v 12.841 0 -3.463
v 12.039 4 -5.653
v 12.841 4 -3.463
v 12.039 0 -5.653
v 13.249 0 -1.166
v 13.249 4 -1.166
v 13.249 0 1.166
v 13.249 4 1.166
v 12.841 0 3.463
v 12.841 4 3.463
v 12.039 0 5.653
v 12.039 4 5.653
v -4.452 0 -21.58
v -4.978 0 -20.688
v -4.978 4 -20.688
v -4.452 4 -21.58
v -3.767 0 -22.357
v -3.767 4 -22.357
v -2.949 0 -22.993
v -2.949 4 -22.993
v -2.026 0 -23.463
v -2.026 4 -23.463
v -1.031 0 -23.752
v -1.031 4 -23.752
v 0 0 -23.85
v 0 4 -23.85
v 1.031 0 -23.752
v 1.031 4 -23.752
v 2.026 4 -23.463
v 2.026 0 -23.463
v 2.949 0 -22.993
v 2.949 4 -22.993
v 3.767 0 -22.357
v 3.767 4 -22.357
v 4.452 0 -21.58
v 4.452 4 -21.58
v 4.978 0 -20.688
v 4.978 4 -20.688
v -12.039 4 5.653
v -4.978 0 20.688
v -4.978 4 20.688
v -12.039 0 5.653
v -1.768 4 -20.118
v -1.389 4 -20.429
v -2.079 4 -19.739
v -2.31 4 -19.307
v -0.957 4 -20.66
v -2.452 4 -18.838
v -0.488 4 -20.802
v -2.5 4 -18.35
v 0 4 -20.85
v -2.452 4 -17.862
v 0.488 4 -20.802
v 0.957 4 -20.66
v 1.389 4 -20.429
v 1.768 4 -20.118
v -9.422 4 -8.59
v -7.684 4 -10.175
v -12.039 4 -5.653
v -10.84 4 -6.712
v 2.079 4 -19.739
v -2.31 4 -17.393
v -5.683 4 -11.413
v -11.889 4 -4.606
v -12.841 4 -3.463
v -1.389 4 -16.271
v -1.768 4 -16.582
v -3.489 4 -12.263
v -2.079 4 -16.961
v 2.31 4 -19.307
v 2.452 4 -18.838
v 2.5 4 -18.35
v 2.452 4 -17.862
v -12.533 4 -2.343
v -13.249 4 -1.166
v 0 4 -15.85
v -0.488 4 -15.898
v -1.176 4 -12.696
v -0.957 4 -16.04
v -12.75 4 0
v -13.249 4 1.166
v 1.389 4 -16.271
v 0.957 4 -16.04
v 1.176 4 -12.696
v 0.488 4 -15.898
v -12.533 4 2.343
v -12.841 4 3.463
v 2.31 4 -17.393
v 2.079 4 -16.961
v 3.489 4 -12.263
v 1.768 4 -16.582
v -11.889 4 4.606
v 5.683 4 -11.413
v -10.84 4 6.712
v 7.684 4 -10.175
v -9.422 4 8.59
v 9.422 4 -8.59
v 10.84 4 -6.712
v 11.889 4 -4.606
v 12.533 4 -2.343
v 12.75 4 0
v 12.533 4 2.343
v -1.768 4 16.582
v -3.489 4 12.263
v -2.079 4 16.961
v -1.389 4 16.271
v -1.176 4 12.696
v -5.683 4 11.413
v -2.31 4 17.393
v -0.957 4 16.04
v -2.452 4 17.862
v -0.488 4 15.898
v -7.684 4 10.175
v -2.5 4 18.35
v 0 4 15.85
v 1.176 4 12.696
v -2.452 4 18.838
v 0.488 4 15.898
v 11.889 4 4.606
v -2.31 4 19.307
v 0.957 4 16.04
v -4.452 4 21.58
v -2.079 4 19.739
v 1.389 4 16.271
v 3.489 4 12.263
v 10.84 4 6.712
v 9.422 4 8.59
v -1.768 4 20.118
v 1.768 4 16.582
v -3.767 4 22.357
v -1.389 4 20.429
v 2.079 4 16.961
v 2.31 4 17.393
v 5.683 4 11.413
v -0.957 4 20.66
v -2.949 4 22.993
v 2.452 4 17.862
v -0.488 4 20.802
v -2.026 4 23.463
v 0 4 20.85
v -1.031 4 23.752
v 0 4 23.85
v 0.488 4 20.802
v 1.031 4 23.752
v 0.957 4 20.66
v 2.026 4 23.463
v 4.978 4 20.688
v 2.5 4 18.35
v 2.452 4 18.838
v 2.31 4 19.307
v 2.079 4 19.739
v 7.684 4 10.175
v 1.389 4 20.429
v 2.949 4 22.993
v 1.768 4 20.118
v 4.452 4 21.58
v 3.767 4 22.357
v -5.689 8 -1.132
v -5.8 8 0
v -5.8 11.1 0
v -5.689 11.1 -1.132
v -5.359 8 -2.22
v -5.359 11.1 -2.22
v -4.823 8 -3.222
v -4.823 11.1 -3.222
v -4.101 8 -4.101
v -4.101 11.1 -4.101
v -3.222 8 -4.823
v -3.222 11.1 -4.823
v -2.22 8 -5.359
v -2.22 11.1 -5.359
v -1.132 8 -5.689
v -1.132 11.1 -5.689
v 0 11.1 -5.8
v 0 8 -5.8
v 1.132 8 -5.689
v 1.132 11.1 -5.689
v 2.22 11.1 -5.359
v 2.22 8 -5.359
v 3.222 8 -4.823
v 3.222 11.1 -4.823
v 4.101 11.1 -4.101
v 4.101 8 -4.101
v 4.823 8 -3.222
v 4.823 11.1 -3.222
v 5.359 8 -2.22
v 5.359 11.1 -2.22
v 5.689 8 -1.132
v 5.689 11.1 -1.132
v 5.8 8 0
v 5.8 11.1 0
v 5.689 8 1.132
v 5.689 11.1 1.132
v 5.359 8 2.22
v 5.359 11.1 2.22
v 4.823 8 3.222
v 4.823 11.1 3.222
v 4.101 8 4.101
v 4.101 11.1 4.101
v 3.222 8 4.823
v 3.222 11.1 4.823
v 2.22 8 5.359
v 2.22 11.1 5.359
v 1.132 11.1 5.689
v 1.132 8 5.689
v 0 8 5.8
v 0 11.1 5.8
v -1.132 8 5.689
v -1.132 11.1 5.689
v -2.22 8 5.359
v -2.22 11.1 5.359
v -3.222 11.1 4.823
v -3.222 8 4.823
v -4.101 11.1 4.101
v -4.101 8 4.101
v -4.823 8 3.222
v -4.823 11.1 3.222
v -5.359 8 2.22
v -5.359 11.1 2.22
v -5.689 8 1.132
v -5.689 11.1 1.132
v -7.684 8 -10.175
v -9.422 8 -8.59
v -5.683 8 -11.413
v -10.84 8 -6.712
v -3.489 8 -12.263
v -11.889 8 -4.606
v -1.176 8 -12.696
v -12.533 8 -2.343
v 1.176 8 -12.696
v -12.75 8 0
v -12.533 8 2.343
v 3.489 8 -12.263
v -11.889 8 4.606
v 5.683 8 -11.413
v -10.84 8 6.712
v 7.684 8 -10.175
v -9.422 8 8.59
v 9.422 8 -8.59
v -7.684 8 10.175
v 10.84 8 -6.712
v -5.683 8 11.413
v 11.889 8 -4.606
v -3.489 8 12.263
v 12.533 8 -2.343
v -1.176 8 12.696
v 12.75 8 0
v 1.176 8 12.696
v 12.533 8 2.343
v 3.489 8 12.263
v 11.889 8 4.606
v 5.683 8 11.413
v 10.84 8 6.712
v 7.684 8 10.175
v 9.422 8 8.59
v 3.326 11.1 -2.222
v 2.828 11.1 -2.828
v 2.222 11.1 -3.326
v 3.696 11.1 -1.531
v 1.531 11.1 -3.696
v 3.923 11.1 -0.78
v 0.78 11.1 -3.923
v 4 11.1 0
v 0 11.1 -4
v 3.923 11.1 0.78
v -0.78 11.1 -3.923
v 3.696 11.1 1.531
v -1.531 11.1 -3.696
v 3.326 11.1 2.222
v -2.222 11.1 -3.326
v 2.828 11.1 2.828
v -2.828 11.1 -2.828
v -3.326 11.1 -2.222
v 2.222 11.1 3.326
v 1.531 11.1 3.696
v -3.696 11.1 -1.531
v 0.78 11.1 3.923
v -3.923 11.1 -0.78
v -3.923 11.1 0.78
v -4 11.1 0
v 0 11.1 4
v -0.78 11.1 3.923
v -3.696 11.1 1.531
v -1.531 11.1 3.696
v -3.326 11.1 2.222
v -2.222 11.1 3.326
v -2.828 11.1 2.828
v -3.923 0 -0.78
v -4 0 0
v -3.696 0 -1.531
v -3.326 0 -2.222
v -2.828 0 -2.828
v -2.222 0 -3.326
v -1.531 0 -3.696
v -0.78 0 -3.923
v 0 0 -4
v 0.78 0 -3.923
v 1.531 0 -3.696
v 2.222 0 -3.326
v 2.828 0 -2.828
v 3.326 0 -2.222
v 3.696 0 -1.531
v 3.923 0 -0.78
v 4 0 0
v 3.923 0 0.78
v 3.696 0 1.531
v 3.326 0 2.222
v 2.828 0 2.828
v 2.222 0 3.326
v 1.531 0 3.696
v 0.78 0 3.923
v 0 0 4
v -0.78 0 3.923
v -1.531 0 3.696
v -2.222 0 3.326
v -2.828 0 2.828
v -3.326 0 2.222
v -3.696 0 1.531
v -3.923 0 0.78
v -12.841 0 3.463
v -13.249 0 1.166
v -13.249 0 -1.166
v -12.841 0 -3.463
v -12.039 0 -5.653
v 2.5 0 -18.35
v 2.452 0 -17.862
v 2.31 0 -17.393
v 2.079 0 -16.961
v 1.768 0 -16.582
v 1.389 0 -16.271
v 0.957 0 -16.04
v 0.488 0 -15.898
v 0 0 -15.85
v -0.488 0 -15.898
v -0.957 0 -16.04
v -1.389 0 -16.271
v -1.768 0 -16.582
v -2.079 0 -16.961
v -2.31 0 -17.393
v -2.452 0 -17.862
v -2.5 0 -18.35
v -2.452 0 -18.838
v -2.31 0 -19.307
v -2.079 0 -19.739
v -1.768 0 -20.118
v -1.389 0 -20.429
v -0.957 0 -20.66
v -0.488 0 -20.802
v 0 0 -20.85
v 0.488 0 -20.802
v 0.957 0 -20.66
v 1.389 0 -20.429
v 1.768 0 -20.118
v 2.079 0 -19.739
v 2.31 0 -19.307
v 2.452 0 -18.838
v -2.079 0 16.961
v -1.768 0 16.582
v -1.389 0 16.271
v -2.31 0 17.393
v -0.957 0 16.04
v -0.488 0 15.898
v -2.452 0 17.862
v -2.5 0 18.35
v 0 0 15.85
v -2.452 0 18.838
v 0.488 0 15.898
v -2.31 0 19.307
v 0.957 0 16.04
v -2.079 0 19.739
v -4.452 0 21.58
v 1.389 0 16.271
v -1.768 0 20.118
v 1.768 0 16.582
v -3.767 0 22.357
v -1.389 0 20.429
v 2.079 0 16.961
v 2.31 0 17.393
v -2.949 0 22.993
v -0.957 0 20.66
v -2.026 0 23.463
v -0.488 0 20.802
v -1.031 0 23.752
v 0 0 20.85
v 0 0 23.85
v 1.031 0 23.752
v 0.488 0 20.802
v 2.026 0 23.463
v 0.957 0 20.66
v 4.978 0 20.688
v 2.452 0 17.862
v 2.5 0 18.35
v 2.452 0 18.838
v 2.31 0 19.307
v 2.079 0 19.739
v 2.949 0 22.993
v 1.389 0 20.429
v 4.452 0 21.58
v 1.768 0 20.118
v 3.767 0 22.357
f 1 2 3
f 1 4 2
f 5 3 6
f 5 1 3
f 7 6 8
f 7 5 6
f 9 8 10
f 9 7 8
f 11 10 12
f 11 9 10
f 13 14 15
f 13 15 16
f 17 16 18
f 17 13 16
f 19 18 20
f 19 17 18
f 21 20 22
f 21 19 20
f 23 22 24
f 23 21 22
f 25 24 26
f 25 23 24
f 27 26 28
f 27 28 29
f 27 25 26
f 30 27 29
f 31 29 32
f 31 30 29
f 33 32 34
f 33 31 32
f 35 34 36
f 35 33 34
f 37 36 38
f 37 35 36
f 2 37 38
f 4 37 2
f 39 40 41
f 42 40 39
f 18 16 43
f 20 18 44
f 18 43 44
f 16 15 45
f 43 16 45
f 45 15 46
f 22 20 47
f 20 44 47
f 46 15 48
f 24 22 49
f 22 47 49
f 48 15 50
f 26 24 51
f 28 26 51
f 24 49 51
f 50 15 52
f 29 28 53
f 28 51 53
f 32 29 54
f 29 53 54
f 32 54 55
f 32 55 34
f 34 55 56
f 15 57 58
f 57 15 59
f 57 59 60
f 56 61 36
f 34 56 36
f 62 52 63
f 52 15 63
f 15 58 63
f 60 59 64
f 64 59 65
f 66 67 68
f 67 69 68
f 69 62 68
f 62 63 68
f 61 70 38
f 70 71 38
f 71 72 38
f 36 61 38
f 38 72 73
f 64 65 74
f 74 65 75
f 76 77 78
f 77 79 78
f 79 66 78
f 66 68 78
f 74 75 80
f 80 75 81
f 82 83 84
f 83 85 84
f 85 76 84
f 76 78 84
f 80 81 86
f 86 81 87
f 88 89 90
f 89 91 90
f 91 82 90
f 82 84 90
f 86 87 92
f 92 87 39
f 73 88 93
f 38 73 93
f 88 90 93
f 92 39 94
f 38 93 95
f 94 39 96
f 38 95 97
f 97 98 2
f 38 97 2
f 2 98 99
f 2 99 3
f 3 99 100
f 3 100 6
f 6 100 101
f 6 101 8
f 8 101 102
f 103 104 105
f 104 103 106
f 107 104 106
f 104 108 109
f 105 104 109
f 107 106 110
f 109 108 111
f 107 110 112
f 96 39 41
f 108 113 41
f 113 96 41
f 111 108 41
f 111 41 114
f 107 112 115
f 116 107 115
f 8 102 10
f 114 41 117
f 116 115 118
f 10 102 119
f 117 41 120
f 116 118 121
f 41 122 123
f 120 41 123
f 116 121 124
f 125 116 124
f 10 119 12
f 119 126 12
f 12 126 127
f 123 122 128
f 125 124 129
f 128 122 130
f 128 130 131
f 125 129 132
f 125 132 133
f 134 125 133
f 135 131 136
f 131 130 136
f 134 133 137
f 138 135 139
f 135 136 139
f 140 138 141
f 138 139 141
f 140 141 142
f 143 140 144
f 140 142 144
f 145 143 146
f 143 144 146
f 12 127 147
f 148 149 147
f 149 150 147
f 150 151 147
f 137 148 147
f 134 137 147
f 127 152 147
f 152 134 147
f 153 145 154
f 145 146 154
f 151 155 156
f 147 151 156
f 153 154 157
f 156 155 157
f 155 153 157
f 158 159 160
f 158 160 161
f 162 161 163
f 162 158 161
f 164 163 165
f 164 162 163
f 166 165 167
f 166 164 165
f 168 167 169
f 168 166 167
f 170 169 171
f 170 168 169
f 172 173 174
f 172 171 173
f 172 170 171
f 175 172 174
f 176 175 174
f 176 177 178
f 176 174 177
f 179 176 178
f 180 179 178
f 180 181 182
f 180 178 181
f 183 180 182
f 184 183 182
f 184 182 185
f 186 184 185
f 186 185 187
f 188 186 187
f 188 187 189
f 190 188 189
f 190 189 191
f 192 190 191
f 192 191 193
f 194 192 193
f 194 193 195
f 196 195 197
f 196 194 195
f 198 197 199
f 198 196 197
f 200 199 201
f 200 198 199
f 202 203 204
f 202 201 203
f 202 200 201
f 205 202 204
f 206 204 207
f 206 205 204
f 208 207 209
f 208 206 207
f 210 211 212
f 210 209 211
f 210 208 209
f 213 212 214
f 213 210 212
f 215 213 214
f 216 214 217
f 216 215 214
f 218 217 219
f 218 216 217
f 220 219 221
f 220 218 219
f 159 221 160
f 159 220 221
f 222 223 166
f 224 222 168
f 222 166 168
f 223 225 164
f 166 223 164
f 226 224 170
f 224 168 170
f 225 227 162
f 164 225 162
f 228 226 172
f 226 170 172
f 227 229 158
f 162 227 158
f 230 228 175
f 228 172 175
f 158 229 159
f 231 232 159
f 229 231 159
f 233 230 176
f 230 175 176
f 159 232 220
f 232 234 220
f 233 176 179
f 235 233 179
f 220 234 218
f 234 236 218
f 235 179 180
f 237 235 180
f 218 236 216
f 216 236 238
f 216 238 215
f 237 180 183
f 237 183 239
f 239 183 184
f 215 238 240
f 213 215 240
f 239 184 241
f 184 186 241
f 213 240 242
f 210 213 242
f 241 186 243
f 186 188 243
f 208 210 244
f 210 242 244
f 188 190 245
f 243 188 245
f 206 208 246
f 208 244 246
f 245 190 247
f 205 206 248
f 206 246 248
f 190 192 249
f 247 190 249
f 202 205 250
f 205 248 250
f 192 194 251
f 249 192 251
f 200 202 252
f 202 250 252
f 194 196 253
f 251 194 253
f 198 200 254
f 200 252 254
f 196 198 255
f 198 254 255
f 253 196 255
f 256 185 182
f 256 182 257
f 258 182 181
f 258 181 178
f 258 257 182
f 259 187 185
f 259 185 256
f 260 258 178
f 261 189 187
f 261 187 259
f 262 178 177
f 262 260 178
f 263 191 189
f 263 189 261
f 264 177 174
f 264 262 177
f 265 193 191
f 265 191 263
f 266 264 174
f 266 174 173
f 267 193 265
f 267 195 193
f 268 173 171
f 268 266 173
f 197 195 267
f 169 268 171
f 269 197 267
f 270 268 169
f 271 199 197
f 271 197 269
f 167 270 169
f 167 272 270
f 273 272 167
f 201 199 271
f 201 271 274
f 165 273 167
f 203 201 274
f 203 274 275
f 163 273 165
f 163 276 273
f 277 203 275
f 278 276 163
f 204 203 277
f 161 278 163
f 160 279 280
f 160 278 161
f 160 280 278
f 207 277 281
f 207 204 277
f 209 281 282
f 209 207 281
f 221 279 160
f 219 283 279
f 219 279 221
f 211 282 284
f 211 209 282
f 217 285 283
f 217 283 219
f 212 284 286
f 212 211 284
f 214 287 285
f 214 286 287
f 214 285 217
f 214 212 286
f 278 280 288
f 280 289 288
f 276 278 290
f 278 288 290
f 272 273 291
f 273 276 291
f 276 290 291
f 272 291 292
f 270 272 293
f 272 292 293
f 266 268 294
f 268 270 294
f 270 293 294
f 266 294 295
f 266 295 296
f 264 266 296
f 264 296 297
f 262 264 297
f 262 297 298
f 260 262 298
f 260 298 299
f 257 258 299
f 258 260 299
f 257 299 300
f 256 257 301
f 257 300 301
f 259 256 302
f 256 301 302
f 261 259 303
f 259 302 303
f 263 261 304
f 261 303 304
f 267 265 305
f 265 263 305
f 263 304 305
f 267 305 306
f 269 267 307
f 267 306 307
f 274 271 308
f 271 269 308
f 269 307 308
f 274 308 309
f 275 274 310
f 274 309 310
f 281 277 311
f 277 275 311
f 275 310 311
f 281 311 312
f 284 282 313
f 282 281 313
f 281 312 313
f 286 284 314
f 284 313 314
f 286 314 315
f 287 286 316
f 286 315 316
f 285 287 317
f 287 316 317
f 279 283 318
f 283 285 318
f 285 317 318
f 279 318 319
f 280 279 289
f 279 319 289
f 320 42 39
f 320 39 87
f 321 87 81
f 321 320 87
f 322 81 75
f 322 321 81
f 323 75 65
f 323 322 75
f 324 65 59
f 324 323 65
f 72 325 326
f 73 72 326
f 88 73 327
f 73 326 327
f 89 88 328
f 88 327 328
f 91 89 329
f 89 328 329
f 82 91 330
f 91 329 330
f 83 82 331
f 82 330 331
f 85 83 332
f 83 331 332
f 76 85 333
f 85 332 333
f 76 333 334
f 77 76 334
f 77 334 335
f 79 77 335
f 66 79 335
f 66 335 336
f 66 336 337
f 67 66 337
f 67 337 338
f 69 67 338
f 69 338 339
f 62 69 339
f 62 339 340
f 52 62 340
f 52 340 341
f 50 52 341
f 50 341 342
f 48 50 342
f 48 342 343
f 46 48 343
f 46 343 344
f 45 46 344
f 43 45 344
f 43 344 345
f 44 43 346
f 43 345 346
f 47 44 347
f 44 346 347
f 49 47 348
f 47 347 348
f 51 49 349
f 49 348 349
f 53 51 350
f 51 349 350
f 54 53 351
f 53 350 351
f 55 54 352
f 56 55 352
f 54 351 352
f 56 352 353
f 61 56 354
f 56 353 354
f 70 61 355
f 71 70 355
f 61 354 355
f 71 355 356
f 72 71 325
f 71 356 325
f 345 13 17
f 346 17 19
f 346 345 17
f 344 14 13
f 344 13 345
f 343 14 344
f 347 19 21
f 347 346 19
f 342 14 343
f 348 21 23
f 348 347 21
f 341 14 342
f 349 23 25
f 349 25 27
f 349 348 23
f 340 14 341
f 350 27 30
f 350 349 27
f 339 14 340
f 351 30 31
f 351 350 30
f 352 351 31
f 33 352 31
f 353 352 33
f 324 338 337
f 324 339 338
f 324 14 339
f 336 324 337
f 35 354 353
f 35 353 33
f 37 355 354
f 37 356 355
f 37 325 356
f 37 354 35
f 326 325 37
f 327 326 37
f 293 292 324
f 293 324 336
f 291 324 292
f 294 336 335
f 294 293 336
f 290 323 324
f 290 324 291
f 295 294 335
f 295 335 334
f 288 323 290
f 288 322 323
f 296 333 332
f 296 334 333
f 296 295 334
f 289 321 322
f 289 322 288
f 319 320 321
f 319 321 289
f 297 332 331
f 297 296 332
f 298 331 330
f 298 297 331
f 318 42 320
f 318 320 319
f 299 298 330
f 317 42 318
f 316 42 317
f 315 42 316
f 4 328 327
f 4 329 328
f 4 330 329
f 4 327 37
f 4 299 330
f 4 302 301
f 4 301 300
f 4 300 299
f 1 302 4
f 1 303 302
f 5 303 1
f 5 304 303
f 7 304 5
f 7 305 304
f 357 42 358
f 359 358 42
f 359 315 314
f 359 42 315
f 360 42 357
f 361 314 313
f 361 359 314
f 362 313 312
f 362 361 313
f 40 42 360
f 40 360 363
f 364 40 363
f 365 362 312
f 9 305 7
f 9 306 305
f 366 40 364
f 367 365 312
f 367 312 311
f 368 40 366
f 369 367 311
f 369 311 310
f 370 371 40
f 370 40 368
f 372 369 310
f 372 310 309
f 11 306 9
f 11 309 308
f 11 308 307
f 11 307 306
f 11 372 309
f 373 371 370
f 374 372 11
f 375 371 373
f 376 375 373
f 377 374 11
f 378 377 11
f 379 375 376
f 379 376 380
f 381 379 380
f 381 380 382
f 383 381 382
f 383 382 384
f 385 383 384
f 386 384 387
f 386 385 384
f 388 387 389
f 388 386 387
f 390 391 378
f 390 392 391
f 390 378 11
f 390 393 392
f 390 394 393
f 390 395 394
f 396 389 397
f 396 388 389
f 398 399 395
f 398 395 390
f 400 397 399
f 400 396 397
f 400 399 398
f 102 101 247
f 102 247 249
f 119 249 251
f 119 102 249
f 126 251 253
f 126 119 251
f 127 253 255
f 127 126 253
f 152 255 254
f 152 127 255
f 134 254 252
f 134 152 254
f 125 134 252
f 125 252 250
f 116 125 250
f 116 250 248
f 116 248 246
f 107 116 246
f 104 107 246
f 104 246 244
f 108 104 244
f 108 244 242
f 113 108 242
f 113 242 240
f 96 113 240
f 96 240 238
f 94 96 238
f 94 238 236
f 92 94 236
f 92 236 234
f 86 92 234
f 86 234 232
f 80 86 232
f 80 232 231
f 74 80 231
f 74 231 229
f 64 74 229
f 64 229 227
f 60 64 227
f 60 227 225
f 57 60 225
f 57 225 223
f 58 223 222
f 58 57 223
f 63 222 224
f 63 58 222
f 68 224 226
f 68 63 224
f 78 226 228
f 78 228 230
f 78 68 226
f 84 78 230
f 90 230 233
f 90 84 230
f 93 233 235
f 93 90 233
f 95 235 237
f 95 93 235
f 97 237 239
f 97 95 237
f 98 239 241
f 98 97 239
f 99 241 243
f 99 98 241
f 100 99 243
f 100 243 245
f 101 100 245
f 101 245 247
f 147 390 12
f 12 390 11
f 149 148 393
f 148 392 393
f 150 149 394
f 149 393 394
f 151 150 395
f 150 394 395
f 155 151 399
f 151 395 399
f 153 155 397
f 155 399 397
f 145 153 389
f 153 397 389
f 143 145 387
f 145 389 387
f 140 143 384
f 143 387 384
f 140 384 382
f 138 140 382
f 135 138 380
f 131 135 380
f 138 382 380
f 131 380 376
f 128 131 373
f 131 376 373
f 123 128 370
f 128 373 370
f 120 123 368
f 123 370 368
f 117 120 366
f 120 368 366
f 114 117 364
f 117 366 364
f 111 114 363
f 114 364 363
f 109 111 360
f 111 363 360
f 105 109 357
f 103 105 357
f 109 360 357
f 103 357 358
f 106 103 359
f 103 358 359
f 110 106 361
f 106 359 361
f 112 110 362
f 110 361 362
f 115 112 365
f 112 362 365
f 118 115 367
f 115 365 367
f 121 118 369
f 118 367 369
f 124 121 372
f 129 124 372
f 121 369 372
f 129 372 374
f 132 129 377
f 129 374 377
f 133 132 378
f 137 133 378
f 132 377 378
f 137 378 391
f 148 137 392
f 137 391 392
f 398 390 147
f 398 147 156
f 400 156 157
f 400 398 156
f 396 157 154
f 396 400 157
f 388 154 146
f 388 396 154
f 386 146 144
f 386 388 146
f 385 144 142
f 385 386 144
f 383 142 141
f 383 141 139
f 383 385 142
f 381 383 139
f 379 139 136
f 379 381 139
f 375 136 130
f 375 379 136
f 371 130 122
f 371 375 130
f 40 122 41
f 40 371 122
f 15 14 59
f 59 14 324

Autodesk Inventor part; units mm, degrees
ref_plane "YZ Plane" through (0, 0, 0) normal (1, 0, 0) x (0, 1, 0)
ref_plane "XZ Plane" through (0, 0, 0) normal (0, 1, 0) x (-1, 0, 0)
ref_plane "XY Plane" through (0, 0, 0) normal (0, 0, 1) x (1, 0, 0)
sketch "Sketch1" plane through (0, 0, 0) normal (0, 1, 0) x (-1, 0, 0)
  circle A0 centre (0, -18.35) radius 2.5
  circle A1 centre (0, 18.35) radius 2.5
  circle A2 centre (0, 0) radius 4
  circle A3 centre (0, 0) radius 5.8
  circle A4 centre (0, 0) radius 12.75
  line L0 (4.9784, -20.6879) -> (12.0386, -5.6534)
  line L1 (-4.9784, -20.6879) -> (-12.0386, -5.6534)
  line L2 (4.9784, 20.6879) -> (12.0386, 5.6534)
  line L3 (-4.9784, 20.6879) -> (-12.0386, 5.6534)
  arc A5 (-4.9784, -20.6879) -> (4.9784, -20.6879) centre (0, -18.35) ccw
  arc A6 (4.9784, 20.6879) -> (-4.9784, 20.6879) centre (0, 18.35) ccw
  arc A7 (-12.0386, 5.6534) -> (-12.0386, -5.6534) centre (0, 0) ccw
  arc A8 (12.0386, -5.6534) -> (12.0386, 5.6534) centre (0, 0) ccw
  dimension "d2" = 18.35
  dimension "d4" = 18.35
  dimension "d5" = 5
  dimension "d6" = 5
  dimension "d7" = 8
  dimension "d8" = 11.6
  dimension "d9" = 25.5
  dimension "d10" = 0
  dimension "d12" = 0
extrude "Extrusion1" add sketch "Sketch1" along normal blind 11.1 contours A3
sketch "Sketch2" plane through (0, 0, 0) normal (0, -1, 0) x (1, 0, 0)
  circle A0 centre (0, -18.35) radius 2.5
  circle A1 centre (0, 18.35) radius 2.5
  circle A2 centre (0, 0) radius 4
  circle A3 centre (0, 0) radius 5.8
  circle A4 centre (0, 0) radius 12.75
  line L0 (4.9784, -20.6879) -> (12.0386, -5.6534)
  line L1 (-4.9784, -20.6879) -> (-12.0386, -5.6534)
  line L2 (4.9784, 20.6879) -> (12.0386, 5.6534)
  line L3 (-4.9784, 20.6879) -> (-12.0386, 5.6534)
  arc A5 (-4.9784, -20.6879) -> (4.9784, -20.6879) centre (0, -18.35) ccw
  arc A6 (4.9784, 20.6879) -> (-4.9784, 20.6879) centre (0, 18.35) ccw
  arc A7 (-12.0386, 5.6534) -> (-12.0386, -5.6534) centre (0, 0) ccw
  arc A8 (12.0386, -5.6534) -> (12.0386, 5.6534) centre (0, 0) ccw
  dimension "d15" = 18.35
  dimension "d16" = 18.35
  dimension "d17" = 5
  dimension "d18" = 5
  dimension "d19" = 8
  dimension "d20" = 11.6
  dimension "d21" = 25.5
  dimension "d22" = 0
  dimension "d23" = 0
  dimension "d24" = 0
  dimension "d25" = 0
extrude "Extrusion2" add sketch "Sketch2" against normal blind 8 contours A4
sketch "Sketch3" plane through (0, 0, 0) normal (0, -1, 0) x (1, 0, 0)
  circle A0 centre (0, -18.35) radius 2.5
  circle A1 centre (0, 18.35) radius 2.5
  circle A2 centre (0, 0) radius 4
  line L0 (4.9784, -20.6879) -> (12.0386, -5.6534)
  line L1 (-4.9784, -20.6879) -> (-12.0386, -5.6534)
  line L2 (4.9784, 20.6879) -> (12.0386, 5.6534)
  line L3 (-4.9784, 20.6879) -> (-12.0386, 5.6534)
  arc A3 (-4.9784, -20.6879) -> (4.9784, -20.6879) centre (0, -18.35) ccw
  arc A4 (4.9784, 20.6879) -> (-4.9784, 20.6879) centre (0, 18.35) ccw
  arc A5 (-12.0386, 5.6534) -> (-12.0386, -5.6534) centre (0, 0) ccw
  arc A6 (12.0386, -5.6534) -> (12.0386, 5.6534) centre (0, 0) ccw
  dimension "d28" = 18.35
  dimension "d29" = 18.35
  dimension "d30" = 5
  dimension "d31" = 5
  dimension "d32" = 8
  dimension "d35" = 0
  dimension "d36" = 0
  dimension "d37" = 0
  dimension "d38" = 0
extrude "Extrusion3" add sketch "Sketch3" against normal blind 4
ref_plane "Work Plane1" through (0, 4, 23.85) normal (1, 0, 0) x (0, -1, 0)
equation "\"d4\" = d2"
equation "\"d16\" = d15"
equation "\"d29\" = d28"
properties part number "Bearing"
